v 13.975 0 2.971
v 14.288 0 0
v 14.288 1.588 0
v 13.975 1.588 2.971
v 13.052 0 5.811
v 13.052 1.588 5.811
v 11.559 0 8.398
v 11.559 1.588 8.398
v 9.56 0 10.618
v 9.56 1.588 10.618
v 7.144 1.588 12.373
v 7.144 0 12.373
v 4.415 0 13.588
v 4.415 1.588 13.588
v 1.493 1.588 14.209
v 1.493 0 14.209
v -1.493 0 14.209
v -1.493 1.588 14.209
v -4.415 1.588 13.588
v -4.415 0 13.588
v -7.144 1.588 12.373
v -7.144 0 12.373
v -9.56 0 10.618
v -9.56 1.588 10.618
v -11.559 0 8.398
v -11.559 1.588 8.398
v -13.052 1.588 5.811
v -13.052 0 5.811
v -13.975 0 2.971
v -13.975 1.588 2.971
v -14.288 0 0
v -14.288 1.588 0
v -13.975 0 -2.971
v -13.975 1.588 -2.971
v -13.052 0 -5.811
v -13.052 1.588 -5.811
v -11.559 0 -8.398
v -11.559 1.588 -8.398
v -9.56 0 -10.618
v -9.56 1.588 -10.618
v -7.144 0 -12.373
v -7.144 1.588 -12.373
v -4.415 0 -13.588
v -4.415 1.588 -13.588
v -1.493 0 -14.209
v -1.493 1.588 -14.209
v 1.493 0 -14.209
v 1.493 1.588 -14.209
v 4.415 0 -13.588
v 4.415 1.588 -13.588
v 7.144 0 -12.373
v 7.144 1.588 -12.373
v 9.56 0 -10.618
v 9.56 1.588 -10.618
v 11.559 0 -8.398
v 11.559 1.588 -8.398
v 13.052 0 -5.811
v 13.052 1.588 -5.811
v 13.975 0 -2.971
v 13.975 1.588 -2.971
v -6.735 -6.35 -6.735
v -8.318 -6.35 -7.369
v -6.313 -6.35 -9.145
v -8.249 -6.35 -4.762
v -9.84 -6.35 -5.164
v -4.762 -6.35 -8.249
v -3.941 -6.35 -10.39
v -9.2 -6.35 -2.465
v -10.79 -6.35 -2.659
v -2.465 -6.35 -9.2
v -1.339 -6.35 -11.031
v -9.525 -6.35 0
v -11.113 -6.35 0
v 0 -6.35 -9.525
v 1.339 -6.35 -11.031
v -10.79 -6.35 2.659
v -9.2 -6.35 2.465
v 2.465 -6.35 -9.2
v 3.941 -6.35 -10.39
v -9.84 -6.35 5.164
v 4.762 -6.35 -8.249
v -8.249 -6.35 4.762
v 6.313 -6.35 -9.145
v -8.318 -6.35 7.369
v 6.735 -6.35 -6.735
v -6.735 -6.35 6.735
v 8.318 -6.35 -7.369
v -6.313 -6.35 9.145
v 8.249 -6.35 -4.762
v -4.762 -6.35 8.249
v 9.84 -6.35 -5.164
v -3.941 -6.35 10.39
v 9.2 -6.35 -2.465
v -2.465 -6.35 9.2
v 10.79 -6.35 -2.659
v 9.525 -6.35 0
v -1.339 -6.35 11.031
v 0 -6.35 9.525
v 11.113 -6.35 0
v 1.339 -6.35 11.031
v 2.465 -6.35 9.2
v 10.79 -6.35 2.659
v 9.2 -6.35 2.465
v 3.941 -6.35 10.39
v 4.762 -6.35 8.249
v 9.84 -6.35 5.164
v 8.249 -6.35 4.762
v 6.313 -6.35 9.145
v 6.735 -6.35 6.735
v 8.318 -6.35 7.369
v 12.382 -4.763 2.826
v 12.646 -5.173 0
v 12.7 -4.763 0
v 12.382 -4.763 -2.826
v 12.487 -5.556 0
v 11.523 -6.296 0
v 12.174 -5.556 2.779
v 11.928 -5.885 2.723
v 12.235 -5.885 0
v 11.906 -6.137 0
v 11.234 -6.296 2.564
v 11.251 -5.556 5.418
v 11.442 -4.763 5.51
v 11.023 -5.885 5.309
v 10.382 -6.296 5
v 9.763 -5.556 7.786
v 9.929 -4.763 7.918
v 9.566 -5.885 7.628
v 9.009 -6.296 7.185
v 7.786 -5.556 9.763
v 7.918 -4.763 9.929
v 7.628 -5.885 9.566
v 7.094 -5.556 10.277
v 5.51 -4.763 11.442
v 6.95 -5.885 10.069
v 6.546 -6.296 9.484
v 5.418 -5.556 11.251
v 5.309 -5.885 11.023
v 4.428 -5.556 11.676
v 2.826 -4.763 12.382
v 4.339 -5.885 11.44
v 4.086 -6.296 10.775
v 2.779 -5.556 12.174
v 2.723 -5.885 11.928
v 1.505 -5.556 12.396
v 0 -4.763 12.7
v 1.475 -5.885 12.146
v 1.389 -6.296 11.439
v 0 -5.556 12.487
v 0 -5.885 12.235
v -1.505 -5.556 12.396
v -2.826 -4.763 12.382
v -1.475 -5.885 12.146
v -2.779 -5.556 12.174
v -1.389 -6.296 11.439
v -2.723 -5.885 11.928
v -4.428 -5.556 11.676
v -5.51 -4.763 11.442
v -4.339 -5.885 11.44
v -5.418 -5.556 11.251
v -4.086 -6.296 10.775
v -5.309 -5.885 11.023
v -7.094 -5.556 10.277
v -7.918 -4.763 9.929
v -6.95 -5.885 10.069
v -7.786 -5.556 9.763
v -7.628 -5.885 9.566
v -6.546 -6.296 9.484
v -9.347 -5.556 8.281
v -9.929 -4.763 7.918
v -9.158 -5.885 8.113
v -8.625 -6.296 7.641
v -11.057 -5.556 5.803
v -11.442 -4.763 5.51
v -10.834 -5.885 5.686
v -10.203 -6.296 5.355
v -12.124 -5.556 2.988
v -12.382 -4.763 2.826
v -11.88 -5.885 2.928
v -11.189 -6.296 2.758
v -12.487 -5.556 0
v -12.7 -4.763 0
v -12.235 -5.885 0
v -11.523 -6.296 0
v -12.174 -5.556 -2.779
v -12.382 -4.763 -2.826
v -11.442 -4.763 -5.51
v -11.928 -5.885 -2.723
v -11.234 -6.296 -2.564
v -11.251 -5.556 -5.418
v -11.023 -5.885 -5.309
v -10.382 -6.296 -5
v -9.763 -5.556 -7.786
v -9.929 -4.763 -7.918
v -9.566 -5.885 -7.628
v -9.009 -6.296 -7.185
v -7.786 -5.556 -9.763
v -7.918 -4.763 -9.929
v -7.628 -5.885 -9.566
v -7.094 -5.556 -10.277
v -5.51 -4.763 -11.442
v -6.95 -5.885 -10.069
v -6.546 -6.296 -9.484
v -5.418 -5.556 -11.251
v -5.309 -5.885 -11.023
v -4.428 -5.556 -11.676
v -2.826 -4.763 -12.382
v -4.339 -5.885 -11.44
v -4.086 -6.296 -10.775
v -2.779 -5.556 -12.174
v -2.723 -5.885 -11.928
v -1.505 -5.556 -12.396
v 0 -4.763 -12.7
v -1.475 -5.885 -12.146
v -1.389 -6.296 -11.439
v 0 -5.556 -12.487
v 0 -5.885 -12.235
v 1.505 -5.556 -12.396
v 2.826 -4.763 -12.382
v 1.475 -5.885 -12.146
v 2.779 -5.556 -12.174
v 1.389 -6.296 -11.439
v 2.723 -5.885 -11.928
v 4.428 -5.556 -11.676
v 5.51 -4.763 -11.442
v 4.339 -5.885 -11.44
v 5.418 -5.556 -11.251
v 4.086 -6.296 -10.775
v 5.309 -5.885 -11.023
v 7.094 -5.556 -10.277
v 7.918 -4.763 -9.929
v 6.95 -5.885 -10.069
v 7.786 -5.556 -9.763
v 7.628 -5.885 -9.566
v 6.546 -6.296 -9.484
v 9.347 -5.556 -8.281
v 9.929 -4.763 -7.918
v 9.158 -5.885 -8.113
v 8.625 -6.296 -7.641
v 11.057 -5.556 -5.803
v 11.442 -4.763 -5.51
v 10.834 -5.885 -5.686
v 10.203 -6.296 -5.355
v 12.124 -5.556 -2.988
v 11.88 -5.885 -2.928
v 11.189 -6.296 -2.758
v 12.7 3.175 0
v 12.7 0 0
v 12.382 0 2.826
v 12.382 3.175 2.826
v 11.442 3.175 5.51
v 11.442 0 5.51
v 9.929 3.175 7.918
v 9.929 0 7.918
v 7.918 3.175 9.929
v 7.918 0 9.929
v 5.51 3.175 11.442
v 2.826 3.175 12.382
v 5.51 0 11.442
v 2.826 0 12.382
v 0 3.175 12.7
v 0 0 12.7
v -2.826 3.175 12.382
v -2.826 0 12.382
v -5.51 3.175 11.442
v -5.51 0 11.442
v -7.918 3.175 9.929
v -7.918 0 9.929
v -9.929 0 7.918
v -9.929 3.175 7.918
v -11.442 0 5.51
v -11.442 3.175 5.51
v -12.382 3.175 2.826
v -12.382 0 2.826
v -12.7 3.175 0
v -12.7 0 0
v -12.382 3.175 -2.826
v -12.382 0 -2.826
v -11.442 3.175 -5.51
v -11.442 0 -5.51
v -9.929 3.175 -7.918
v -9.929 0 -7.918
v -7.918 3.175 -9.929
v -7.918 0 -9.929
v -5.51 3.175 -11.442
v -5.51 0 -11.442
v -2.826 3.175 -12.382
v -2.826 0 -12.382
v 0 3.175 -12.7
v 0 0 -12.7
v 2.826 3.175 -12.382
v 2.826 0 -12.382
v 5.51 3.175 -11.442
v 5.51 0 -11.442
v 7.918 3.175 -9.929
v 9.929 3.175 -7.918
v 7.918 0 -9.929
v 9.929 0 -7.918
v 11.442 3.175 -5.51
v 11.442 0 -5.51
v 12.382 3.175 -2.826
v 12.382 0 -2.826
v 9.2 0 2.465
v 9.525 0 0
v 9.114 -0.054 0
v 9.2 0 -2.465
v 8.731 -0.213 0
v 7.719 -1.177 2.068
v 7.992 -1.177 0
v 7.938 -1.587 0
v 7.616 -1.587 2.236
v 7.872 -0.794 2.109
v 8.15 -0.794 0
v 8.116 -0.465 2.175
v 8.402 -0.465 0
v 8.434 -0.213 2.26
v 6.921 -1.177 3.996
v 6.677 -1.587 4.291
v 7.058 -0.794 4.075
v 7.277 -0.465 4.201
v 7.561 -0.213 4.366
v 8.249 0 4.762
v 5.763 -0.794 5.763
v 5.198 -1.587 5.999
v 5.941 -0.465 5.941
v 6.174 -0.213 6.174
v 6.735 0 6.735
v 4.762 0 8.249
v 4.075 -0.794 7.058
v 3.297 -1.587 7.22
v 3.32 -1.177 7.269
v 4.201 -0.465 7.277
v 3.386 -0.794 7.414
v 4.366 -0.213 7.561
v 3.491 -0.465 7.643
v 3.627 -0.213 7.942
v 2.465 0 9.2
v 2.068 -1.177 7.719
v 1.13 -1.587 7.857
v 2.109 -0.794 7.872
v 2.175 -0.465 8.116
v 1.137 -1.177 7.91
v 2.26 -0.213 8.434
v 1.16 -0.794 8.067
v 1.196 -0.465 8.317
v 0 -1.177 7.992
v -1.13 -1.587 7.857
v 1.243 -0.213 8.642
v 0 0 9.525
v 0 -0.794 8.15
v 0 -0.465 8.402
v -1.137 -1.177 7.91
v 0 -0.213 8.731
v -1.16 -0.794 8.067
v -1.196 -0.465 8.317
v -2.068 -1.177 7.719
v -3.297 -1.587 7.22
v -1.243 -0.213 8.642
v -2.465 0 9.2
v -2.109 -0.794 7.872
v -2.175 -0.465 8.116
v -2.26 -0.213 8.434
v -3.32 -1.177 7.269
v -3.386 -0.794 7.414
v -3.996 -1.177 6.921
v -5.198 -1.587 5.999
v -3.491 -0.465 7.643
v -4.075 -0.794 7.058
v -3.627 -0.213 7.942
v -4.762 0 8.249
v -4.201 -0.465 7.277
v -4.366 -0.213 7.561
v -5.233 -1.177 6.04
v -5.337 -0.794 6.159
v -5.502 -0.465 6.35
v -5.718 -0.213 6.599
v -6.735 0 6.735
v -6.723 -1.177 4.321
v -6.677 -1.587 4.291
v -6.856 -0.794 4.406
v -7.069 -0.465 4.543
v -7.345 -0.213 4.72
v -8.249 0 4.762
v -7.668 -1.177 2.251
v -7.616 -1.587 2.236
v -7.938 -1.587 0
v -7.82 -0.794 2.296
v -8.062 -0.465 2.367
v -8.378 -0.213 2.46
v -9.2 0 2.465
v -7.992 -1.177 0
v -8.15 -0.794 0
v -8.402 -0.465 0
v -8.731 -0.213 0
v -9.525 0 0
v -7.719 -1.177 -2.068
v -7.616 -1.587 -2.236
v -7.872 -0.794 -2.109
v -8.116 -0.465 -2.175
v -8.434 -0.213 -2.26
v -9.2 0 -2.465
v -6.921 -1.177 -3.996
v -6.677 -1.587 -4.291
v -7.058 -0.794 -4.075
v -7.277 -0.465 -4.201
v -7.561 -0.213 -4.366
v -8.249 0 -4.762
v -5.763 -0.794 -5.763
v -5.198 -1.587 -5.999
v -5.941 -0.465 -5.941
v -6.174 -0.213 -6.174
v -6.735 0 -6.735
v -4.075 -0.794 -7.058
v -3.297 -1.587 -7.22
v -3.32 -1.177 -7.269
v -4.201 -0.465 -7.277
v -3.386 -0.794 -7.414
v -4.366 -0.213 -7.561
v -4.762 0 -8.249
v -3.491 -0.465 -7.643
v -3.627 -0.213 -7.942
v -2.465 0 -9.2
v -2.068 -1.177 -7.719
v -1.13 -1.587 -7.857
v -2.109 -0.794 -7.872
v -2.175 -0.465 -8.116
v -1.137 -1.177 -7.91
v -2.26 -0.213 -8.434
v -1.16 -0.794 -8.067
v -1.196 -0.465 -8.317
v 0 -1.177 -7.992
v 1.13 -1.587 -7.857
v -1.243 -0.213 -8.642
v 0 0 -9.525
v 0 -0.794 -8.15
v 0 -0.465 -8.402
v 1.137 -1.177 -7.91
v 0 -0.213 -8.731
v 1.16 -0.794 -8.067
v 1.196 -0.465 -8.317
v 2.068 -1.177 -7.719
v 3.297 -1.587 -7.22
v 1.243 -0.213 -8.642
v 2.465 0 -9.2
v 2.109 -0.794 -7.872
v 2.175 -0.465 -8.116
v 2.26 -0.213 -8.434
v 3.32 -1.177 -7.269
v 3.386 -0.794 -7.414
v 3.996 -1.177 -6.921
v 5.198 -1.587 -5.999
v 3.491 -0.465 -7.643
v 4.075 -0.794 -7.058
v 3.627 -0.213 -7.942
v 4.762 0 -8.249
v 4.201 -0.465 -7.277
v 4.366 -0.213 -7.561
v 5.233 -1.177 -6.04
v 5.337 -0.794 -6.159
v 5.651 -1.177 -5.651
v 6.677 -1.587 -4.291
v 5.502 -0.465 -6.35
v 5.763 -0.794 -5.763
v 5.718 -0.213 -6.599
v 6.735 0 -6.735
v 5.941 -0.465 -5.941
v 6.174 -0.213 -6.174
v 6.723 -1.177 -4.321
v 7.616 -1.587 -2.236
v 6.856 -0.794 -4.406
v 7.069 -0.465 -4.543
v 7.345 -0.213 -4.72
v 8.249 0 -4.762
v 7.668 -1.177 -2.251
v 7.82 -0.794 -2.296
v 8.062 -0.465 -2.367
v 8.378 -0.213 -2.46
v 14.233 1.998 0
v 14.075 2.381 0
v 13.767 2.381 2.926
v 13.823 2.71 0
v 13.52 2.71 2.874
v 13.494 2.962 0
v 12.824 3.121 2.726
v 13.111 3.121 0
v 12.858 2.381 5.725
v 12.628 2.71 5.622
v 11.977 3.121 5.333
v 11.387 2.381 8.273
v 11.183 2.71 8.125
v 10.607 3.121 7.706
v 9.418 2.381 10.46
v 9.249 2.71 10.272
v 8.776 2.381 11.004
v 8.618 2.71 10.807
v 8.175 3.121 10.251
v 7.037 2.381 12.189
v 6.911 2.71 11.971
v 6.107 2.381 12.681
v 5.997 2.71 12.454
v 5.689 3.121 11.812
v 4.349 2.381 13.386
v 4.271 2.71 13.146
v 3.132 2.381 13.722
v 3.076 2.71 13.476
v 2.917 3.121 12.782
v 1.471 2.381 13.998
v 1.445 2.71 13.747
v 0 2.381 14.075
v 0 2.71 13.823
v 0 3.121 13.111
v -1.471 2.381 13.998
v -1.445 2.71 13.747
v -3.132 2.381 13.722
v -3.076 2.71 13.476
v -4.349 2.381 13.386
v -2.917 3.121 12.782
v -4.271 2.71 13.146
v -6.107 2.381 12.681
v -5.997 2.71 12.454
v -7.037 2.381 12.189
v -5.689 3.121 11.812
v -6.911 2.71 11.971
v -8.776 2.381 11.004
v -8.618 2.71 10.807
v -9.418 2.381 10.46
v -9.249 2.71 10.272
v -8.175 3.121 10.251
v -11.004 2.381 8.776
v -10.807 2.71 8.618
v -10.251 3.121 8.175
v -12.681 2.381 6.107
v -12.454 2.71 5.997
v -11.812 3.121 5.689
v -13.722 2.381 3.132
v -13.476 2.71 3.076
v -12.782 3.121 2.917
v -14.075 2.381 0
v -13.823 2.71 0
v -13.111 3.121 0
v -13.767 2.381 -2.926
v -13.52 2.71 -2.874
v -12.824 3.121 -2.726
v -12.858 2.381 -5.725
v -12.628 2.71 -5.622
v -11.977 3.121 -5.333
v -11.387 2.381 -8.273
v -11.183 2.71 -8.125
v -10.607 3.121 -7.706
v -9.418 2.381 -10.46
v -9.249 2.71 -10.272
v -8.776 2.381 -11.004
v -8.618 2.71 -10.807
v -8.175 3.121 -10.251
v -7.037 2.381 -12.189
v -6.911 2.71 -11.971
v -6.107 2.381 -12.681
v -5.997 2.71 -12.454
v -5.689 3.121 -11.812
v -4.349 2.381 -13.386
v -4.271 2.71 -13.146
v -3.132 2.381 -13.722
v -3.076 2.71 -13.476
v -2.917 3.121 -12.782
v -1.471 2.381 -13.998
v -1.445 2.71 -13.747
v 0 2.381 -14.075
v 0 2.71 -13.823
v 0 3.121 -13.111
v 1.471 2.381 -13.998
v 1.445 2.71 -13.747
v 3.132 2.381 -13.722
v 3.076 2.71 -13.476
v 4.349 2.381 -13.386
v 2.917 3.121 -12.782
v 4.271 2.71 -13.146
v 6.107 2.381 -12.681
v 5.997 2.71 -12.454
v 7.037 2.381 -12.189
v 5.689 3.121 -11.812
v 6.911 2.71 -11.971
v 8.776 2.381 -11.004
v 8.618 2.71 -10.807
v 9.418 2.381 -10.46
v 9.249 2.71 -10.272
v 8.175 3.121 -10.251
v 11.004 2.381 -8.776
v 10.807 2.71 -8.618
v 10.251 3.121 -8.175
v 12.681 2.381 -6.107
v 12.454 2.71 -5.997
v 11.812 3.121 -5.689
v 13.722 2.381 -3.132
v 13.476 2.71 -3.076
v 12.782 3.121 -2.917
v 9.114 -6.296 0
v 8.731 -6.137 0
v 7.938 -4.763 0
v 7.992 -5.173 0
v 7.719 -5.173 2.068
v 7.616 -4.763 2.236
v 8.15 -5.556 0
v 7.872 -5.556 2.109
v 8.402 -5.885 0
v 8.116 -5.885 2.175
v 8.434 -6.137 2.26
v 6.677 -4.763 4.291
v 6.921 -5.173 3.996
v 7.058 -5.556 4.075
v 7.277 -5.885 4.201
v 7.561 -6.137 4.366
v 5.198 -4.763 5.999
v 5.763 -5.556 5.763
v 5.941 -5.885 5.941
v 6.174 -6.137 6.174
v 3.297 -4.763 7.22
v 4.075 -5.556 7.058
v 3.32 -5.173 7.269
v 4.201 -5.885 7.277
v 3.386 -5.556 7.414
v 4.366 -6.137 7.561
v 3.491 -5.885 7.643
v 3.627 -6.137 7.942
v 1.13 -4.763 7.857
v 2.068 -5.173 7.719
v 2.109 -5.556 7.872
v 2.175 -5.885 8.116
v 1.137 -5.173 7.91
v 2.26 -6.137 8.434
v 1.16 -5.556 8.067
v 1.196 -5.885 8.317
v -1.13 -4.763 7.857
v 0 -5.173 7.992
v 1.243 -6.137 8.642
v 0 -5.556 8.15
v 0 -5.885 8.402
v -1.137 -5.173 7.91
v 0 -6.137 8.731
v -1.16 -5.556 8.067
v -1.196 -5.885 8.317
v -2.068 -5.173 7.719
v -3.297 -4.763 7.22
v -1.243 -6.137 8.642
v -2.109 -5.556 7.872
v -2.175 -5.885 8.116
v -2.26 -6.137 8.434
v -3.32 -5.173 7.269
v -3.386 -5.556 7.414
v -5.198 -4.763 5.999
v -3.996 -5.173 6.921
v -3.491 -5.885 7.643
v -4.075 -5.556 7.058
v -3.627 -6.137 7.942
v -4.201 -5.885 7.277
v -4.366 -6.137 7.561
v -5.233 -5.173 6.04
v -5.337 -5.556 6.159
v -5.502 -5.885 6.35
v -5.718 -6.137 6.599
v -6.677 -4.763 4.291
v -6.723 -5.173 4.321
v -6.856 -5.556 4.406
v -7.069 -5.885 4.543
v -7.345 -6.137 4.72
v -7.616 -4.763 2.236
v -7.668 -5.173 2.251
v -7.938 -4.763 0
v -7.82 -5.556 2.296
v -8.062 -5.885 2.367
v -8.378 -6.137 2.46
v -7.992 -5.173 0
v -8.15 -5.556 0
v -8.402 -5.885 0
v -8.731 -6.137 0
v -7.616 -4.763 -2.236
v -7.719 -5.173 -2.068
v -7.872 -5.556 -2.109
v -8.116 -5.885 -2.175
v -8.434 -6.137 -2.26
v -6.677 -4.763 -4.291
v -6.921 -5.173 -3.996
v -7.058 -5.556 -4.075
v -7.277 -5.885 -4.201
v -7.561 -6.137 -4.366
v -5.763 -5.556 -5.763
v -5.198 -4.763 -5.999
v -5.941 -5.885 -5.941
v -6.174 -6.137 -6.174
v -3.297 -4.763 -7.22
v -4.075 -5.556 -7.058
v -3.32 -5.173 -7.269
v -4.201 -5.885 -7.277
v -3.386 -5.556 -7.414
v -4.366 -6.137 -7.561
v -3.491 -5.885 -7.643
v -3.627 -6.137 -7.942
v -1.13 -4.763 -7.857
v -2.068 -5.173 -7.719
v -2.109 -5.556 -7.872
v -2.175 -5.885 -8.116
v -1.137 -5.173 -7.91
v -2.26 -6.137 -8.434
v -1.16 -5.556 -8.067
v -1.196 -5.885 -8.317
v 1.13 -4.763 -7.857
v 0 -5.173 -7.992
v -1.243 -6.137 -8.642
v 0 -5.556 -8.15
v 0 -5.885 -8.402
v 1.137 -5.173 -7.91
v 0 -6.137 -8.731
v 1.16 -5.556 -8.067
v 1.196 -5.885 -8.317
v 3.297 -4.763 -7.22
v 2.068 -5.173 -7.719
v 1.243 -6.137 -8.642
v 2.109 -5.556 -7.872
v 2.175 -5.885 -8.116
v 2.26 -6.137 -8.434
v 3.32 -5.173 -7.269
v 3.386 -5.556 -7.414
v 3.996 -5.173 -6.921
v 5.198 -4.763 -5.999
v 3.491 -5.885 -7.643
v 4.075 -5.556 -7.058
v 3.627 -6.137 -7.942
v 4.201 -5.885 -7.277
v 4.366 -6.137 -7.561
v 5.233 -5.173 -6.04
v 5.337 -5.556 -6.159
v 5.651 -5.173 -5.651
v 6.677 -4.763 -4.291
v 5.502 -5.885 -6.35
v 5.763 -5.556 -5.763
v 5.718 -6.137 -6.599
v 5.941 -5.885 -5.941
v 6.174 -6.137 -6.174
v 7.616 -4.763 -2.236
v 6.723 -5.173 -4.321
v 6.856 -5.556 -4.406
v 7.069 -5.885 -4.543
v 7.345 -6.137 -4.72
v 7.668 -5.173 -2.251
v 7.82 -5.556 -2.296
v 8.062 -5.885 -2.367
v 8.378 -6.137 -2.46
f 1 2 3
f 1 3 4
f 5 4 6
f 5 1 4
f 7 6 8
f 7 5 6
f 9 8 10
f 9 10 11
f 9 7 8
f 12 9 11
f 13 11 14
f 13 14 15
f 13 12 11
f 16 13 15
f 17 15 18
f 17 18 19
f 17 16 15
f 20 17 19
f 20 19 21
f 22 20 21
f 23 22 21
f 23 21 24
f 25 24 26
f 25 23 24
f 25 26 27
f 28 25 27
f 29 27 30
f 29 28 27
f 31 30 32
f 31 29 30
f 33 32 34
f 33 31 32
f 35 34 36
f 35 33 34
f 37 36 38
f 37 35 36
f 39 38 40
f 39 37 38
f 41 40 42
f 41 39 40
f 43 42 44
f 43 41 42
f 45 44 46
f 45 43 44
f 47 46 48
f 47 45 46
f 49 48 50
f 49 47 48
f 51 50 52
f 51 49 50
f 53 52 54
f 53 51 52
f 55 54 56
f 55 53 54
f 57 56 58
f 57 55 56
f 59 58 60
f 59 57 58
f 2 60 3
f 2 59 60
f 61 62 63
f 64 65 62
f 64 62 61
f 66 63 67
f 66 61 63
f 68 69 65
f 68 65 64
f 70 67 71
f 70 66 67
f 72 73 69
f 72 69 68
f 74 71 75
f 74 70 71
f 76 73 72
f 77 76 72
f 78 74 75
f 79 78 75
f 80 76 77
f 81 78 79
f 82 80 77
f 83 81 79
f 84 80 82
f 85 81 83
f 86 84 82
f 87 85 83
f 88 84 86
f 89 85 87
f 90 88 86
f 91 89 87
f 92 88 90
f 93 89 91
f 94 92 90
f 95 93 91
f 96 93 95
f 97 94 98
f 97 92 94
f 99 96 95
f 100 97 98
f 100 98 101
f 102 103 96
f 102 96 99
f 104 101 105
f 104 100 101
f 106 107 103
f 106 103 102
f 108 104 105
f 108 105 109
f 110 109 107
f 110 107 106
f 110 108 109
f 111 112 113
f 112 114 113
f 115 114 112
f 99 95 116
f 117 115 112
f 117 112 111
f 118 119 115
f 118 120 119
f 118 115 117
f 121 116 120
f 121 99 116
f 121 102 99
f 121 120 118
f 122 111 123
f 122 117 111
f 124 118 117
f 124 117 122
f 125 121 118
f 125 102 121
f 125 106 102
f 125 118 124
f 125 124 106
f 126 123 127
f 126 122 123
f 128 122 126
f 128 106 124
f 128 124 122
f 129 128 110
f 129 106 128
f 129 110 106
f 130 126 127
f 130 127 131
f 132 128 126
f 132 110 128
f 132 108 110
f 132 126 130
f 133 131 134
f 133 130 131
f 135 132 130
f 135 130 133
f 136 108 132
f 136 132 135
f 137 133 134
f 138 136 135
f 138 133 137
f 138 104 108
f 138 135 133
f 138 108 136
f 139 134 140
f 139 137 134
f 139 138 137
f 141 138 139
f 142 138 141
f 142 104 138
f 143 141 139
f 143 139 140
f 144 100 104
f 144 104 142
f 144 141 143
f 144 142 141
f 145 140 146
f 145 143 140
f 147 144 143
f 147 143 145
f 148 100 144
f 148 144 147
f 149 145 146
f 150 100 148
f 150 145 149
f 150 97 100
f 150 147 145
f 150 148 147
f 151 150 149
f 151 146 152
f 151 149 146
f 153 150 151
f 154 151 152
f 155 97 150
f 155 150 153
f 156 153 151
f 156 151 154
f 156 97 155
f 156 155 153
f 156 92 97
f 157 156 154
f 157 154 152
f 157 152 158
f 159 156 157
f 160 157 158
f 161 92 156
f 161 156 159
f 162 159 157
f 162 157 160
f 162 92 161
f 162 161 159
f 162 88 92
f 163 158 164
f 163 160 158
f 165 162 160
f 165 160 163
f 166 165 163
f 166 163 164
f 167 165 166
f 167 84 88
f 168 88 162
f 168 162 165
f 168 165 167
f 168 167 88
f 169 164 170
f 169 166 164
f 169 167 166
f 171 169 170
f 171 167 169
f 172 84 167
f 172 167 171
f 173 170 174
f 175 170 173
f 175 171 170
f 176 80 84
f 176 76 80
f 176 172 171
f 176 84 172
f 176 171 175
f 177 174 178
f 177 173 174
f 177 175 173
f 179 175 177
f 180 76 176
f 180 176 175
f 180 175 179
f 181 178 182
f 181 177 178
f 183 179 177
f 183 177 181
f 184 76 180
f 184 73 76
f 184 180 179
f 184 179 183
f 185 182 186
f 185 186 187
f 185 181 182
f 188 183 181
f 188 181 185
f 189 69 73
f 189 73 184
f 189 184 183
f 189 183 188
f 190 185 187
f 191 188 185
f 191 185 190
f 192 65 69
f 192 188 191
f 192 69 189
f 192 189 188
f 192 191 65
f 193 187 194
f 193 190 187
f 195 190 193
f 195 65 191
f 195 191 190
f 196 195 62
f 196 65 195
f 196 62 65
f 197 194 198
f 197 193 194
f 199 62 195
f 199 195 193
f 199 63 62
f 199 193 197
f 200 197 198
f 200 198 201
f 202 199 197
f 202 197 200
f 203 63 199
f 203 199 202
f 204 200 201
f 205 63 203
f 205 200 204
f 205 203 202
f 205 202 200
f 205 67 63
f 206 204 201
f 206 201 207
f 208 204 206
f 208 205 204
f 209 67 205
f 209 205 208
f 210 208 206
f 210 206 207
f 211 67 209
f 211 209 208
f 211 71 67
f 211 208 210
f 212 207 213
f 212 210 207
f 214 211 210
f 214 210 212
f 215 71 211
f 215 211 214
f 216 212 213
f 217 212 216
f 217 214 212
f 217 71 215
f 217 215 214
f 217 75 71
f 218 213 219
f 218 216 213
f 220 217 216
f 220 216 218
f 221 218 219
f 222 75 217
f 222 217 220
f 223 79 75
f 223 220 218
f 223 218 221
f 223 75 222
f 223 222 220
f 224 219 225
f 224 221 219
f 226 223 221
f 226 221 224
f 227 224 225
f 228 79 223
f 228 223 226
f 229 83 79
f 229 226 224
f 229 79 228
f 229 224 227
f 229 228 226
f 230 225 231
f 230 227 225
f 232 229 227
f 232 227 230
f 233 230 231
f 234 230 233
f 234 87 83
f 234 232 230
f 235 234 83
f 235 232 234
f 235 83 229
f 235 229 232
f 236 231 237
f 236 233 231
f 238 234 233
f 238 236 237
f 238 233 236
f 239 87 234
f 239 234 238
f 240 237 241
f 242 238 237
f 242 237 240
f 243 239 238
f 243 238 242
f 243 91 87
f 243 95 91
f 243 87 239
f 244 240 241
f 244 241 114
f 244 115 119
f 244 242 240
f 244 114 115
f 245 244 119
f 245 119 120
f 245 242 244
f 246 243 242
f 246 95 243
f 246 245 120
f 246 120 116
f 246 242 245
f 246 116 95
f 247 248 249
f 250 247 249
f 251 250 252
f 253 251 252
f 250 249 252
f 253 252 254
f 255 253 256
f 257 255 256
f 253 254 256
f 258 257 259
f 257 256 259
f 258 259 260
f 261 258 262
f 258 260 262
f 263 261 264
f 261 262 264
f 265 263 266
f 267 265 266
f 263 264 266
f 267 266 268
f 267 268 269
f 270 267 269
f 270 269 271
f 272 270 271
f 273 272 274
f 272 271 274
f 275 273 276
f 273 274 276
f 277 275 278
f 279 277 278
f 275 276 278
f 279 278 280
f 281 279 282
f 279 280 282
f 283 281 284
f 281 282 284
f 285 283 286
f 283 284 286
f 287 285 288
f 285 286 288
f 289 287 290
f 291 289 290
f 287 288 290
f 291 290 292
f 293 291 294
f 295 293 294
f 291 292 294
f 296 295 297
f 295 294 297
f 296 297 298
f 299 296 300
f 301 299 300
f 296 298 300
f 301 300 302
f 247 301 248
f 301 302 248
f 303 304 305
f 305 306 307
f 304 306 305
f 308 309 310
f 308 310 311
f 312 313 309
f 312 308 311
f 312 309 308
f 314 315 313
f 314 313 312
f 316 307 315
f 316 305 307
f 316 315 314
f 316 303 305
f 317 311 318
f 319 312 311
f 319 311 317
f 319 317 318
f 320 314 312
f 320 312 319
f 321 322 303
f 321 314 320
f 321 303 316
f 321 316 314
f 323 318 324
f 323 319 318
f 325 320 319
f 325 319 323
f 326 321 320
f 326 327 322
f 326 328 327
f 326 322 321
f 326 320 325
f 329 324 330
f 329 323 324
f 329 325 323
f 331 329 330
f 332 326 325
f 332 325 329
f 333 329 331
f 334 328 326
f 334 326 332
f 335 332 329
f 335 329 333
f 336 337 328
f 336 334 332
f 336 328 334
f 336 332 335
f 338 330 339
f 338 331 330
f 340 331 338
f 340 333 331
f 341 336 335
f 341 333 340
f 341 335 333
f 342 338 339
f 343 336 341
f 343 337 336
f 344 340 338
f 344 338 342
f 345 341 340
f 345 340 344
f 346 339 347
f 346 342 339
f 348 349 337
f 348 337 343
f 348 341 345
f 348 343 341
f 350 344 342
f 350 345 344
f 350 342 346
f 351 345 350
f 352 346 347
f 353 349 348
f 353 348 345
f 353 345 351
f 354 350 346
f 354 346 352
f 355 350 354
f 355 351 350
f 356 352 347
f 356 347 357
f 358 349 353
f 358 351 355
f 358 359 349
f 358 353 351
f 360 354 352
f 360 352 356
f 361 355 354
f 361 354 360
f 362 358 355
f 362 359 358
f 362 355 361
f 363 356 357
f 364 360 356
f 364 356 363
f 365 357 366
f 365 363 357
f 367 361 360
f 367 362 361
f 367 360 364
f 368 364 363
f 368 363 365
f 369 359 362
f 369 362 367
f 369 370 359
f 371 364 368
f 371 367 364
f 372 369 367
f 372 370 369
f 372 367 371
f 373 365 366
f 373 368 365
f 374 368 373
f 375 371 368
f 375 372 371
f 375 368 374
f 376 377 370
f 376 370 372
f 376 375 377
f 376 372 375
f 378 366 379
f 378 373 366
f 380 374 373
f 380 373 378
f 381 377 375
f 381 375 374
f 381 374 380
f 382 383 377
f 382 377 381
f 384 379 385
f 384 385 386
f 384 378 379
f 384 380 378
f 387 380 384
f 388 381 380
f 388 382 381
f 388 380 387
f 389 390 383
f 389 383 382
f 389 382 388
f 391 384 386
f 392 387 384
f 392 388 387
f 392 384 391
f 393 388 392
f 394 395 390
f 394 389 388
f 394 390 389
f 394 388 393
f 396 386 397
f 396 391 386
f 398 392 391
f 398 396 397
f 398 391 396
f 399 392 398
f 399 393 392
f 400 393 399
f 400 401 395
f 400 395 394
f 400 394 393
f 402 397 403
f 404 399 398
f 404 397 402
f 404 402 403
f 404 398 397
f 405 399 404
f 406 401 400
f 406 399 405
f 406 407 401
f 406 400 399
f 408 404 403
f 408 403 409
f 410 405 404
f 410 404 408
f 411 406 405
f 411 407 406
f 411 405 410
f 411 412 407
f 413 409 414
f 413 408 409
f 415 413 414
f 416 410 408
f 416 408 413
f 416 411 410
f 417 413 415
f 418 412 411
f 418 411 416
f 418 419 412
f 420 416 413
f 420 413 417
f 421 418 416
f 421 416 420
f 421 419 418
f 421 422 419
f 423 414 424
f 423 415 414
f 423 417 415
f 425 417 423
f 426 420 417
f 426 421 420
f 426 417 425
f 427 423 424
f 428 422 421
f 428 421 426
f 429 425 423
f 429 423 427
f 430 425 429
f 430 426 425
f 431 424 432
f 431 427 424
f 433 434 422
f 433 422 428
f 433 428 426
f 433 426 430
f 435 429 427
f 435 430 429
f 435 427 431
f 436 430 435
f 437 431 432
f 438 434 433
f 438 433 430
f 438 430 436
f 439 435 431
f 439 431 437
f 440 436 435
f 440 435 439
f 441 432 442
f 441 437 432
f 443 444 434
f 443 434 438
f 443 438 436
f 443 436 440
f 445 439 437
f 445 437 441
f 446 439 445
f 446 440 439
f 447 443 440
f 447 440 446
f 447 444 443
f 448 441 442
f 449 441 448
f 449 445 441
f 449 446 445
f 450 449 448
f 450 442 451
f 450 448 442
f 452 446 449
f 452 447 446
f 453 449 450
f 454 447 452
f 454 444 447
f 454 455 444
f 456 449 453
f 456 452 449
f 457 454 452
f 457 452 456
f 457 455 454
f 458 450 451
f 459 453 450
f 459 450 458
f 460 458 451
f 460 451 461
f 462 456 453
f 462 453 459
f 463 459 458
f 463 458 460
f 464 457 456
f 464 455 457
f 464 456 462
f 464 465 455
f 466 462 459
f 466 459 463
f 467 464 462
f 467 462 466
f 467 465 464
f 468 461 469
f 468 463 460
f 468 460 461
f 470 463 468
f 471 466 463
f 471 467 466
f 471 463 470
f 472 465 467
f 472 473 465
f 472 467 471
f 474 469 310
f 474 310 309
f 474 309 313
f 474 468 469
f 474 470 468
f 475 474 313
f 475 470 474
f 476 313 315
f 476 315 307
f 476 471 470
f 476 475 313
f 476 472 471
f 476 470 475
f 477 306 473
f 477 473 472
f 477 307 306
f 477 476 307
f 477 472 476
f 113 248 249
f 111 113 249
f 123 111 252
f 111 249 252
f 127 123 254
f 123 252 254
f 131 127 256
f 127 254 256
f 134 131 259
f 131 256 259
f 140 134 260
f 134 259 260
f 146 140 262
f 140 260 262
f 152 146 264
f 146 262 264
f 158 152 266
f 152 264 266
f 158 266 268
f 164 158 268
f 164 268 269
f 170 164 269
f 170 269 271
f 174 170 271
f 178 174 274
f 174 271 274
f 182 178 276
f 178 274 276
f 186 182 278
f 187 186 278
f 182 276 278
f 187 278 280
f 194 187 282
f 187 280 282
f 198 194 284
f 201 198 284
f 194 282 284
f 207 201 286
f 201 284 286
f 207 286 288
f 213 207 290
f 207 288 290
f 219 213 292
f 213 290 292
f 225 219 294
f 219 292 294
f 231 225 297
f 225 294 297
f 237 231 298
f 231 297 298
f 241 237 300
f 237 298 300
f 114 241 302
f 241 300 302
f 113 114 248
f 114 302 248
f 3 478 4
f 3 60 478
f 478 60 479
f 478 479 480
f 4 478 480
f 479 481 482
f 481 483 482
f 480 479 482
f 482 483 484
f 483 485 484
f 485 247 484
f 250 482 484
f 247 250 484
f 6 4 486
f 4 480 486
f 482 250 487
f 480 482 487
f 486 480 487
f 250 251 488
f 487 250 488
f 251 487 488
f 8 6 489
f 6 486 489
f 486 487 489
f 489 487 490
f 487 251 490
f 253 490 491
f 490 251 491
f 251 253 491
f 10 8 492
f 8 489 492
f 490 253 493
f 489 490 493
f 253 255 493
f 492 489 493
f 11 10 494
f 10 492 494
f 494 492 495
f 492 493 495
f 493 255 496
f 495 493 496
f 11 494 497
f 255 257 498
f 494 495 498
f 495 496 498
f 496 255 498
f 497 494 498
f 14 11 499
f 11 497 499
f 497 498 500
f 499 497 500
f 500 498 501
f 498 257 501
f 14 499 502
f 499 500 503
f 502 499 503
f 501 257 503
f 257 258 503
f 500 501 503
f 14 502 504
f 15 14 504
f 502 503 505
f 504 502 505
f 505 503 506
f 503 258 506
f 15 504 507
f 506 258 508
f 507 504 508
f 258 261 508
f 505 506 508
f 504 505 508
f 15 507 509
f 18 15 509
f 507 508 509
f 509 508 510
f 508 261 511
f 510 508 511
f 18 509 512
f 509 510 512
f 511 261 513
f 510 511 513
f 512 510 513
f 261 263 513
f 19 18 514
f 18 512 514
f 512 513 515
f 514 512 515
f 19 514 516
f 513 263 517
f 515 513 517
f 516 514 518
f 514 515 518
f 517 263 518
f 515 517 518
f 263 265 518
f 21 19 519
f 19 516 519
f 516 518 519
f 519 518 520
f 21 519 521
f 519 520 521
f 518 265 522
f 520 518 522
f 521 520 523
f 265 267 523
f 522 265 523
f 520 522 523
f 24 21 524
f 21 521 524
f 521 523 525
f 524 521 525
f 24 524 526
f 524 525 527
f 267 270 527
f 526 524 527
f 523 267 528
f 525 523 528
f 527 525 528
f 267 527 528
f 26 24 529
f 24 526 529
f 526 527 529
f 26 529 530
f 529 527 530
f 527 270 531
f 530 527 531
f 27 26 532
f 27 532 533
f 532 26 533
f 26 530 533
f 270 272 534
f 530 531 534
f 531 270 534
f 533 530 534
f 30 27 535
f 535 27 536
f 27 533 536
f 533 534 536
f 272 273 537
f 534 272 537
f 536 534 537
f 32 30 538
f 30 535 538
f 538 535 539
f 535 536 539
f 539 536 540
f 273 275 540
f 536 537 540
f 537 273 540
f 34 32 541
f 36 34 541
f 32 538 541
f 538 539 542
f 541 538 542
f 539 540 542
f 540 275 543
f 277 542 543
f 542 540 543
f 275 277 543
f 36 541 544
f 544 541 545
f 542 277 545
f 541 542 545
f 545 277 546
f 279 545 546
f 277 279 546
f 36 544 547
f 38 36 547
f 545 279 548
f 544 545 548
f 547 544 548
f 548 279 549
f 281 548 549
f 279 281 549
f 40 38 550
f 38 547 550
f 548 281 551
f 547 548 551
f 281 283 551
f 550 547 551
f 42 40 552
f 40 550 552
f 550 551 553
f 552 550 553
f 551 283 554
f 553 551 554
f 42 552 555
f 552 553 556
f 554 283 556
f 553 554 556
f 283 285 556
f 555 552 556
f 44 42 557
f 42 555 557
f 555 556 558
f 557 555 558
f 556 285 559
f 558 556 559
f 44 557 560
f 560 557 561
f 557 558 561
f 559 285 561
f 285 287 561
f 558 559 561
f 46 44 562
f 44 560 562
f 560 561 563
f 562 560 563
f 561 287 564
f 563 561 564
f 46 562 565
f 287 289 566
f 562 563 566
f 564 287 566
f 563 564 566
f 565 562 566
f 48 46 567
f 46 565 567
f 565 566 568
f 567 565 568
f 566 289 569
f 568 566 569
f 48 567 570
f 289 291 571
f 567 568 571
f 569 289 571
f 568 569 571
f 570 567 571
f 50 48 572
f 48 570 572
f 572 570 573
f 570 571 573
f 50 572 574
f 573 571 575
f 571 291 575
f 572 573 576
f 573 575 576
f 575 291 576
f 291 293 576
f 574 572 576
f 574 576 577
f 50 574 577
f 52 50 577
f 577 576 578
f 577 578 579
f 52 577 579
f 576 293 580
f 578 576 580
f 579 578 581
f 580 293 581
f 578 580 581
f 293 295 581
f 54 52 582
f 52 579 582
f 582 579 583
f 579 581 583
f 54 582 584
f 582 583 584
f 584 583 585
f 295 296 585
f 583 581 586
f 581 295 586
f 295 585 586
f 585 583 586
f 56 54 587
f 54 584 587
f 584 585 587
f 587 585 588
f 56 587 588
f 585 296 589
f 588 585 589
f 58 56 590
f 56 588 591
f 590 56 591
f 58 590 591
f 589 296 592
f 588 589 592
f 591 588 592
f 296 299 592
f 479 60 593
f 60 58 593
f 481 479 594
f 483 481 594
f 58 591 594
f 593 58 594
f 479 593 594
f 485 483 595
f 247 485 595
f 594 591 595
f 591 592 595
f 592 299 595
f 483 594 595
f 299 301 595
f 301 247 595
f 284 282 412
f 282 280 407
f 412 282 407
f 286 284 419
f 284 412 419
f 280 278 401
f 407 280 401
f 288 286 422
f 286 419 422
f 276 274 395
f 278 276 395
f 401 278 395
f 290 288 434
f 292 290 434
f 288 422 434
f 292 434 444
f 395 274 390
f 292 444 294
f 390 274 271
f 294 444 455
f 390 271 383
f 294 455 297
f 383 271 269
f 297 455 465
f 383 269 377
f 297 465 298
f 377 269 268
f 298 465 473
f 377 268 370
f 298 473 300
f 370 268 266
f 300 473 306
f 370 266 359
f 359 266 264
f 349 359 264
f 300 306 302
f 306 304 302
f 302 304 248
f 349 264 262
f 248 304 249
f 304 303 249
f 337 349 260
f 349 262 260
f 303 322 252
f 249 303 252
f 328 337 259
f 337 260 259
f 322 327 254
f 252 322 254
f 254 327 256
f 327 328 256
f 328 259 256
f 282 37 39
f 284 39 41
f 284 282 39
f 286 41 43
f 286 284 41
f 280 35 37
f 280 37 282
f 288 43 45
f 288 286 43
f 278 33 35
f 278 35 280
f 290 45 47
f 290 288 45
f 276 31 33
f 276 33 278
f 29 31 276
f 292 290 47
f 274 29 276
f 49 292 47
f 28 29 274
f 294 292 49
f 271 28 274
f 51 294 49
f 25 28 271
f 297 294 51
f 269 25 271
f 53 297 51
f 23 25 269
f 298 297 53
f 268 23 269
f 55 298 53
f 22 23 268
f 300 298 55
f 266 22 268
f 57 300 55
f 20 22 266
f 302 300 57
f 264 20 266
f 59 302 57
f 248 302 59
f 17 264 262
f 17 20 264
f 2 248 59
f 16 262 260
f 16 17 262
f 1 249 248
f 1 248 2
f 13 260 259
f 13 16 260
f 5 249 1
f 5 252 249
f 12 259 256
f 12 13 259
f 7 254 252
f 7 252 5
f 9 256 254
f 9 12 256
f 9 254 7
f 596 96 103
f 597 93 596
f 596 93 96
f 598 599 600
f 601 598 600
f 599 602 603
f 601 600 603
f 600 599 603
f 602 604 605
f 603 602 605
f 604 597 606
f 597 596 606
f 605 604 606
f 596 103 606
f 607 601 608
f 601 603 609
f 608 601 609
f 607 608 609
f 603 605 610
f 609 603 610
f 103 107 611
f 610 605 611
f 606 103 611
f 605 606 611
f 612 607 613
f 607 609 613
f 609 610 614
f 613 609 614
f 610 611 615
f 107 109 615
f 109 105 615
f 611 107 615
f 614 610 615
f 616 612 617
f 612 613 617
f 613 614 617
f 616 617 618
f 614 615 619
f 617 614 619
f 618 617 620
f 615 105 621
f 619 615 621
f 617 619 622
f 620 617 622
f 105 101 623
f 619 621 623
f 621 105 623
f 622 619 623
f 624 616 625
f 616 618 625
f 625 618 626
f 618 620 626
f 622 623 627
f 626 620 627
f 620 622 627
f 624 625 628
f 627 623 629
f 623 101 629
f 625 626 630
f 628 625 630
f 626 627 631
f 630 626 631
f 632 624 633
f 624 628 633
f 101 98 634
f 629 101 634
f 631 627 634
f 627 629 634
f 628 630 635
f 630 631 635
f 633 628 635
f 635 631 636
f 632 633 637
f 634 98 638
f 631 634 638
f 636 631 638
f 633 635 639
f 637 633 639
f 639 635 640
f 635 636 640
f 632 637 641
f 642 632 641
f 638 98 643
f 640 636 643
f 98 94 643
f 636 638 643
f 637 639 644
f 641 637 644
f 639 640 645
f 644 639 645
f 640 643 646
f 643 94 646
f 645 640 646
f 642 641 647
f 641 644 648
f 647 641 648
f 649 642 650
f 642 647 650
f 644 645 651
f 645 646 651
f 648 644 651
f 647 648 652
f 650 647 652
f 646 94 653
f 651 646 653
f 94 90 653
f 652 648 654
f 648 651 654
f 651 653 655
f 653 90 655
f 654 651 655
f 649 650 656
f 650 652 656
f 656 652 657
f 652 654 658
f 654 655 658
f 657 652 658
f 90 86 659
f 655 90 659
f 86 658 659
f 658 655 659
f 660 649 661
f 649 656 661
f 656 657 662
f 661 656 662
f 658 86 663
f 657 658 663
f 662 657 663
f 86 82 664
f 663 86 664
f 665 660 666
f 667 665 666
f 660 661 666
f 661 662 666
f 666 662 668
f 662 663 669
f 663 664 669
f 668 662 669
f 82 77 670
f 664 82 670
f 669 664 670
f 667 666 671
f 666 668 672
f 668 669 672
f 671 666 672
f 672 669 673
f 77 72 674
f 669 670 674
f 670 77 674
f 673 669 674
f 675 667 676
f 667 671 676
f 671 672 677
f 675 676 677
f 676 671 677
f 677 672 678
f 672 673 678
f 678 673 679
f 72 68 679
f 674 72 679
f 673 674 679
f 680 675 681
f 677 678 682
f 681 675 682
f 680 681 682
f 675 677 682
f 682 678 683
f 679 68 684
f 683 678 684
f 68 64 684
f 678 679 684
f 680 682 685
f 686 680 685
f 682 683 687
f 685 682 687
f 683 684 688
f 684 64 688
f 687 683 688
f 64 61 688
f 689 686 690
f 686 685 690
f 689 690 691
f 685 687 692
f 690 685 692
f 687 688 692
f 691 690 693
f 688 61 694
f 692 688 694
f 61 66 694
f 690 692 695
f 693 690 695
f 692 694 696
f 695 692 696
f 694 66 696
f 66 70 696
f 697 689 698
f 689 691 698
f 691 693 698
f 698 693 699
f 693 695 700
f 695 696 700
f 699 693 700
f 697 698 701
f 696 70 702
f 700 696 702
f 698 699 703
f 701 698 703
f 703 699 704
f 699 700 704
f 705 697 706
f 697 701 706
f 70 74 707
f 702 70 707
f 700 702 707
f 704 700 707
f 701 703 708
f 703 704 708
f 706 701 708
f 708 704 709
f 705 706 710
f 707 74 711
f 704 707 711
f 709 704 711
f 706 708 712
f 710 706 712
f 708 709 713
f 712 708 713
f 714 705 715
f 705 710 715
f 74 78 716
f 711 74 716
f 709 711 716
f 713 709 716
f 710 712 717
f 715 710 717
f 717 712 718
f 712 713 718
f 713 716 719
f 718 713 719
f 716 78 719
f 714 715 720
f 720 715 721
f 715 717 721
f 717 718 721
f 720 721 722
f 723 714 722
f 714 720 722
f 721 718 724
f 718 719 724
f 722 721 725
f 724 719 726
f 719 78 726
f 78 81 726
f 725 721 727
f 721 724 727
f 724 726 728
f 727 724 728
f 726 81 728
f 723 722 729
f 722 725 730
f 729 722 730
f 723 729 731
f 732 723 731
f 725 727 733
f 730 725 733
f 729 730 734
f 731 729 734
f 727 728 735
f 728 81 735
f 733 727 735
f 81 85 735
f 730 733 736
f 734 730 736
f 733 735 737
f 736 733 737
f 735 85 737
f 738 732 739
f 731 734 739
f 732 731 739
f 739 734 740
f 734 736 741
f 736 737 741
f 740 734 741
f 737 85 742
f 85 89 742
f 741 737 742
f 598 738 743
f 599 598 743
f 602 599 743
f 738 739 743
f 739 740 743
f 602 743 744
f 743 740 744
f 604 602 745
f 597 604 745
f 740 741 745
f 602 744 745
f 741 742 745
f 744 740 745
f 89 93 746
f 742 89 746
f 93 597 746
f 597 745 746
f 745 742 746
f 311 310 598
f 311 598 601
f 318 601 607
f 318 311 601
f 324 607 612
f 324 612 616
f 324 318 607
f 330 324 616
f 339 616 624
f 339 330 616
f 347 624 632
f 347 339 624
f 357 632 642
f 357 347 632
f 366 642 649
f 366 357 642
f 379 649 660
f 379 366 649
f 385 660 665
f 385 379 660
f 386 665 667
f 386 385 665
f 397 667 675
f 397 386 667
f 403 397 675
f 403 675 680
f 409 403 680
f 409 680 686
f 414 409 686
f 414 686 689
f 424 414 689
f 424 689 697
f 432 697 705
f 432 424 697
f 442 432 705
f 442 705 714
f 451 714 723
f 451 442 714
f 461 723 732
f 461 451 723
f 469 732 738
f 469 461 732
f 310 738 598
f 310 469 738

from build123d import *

# Parameters (mm, degrees)
F0_R     = 12.7
F0_R_2   = 7.9375
F1_DEPTH = 6.35
F0_R_3   = 14.2875
F2_DEPTH = 3.175
F3_R     = 1.58749
F3_2_R   = 1.58749


# Not quite as in the source:
# - a fillet or chamfer is up to 0.001 mm smaller than in the source, because OpenCascade refuses the exact size


with BuildPart() as f1:
    # F0 (on Front) → F1 (new body)
    with BuildSketch(Plane.XZ):
        Circle(F0_R)
        Circle(F0_R_2, mode=Mode.SUBTRACT)
    extrude(amount=F1_DEPTH)

    # F3 (radius 1.5875 in the source; OpenCascade refuses exactly that, so slightly less here)
    f3_edges = [f1.edges().sort_by_distance(p)[0] for p in [
        (-12.7, -6.35, 0),
        (-7.9375, -6.35, 0),
        (-7.9375, 0, 0),
    ]]
    fillet(f3_edges, radius=F3_R)


with BuildPart() as f2:
    # F0 (on Front) → F2 (new body)
    with BuildSketch(Plane.XZ):
        Circle(F0_R_3)
        Circle(F0_R, mode=Mode.SUBTRACT)
    extrude(amount=-F2_DEPTH)

    # F3#2 (radius 1.5875 in the source; OpenCascade refuses exactly that, so slightly less here)
    f3_2_edges = [f2.edges().sort_by_distance(p)[0] for p in [
        (-14.2875, 3.175, 0),
    ]]
    fillet(f3_2_edges, radius=F3_2_R)


solid = Compound([f1.part, f2.part])
